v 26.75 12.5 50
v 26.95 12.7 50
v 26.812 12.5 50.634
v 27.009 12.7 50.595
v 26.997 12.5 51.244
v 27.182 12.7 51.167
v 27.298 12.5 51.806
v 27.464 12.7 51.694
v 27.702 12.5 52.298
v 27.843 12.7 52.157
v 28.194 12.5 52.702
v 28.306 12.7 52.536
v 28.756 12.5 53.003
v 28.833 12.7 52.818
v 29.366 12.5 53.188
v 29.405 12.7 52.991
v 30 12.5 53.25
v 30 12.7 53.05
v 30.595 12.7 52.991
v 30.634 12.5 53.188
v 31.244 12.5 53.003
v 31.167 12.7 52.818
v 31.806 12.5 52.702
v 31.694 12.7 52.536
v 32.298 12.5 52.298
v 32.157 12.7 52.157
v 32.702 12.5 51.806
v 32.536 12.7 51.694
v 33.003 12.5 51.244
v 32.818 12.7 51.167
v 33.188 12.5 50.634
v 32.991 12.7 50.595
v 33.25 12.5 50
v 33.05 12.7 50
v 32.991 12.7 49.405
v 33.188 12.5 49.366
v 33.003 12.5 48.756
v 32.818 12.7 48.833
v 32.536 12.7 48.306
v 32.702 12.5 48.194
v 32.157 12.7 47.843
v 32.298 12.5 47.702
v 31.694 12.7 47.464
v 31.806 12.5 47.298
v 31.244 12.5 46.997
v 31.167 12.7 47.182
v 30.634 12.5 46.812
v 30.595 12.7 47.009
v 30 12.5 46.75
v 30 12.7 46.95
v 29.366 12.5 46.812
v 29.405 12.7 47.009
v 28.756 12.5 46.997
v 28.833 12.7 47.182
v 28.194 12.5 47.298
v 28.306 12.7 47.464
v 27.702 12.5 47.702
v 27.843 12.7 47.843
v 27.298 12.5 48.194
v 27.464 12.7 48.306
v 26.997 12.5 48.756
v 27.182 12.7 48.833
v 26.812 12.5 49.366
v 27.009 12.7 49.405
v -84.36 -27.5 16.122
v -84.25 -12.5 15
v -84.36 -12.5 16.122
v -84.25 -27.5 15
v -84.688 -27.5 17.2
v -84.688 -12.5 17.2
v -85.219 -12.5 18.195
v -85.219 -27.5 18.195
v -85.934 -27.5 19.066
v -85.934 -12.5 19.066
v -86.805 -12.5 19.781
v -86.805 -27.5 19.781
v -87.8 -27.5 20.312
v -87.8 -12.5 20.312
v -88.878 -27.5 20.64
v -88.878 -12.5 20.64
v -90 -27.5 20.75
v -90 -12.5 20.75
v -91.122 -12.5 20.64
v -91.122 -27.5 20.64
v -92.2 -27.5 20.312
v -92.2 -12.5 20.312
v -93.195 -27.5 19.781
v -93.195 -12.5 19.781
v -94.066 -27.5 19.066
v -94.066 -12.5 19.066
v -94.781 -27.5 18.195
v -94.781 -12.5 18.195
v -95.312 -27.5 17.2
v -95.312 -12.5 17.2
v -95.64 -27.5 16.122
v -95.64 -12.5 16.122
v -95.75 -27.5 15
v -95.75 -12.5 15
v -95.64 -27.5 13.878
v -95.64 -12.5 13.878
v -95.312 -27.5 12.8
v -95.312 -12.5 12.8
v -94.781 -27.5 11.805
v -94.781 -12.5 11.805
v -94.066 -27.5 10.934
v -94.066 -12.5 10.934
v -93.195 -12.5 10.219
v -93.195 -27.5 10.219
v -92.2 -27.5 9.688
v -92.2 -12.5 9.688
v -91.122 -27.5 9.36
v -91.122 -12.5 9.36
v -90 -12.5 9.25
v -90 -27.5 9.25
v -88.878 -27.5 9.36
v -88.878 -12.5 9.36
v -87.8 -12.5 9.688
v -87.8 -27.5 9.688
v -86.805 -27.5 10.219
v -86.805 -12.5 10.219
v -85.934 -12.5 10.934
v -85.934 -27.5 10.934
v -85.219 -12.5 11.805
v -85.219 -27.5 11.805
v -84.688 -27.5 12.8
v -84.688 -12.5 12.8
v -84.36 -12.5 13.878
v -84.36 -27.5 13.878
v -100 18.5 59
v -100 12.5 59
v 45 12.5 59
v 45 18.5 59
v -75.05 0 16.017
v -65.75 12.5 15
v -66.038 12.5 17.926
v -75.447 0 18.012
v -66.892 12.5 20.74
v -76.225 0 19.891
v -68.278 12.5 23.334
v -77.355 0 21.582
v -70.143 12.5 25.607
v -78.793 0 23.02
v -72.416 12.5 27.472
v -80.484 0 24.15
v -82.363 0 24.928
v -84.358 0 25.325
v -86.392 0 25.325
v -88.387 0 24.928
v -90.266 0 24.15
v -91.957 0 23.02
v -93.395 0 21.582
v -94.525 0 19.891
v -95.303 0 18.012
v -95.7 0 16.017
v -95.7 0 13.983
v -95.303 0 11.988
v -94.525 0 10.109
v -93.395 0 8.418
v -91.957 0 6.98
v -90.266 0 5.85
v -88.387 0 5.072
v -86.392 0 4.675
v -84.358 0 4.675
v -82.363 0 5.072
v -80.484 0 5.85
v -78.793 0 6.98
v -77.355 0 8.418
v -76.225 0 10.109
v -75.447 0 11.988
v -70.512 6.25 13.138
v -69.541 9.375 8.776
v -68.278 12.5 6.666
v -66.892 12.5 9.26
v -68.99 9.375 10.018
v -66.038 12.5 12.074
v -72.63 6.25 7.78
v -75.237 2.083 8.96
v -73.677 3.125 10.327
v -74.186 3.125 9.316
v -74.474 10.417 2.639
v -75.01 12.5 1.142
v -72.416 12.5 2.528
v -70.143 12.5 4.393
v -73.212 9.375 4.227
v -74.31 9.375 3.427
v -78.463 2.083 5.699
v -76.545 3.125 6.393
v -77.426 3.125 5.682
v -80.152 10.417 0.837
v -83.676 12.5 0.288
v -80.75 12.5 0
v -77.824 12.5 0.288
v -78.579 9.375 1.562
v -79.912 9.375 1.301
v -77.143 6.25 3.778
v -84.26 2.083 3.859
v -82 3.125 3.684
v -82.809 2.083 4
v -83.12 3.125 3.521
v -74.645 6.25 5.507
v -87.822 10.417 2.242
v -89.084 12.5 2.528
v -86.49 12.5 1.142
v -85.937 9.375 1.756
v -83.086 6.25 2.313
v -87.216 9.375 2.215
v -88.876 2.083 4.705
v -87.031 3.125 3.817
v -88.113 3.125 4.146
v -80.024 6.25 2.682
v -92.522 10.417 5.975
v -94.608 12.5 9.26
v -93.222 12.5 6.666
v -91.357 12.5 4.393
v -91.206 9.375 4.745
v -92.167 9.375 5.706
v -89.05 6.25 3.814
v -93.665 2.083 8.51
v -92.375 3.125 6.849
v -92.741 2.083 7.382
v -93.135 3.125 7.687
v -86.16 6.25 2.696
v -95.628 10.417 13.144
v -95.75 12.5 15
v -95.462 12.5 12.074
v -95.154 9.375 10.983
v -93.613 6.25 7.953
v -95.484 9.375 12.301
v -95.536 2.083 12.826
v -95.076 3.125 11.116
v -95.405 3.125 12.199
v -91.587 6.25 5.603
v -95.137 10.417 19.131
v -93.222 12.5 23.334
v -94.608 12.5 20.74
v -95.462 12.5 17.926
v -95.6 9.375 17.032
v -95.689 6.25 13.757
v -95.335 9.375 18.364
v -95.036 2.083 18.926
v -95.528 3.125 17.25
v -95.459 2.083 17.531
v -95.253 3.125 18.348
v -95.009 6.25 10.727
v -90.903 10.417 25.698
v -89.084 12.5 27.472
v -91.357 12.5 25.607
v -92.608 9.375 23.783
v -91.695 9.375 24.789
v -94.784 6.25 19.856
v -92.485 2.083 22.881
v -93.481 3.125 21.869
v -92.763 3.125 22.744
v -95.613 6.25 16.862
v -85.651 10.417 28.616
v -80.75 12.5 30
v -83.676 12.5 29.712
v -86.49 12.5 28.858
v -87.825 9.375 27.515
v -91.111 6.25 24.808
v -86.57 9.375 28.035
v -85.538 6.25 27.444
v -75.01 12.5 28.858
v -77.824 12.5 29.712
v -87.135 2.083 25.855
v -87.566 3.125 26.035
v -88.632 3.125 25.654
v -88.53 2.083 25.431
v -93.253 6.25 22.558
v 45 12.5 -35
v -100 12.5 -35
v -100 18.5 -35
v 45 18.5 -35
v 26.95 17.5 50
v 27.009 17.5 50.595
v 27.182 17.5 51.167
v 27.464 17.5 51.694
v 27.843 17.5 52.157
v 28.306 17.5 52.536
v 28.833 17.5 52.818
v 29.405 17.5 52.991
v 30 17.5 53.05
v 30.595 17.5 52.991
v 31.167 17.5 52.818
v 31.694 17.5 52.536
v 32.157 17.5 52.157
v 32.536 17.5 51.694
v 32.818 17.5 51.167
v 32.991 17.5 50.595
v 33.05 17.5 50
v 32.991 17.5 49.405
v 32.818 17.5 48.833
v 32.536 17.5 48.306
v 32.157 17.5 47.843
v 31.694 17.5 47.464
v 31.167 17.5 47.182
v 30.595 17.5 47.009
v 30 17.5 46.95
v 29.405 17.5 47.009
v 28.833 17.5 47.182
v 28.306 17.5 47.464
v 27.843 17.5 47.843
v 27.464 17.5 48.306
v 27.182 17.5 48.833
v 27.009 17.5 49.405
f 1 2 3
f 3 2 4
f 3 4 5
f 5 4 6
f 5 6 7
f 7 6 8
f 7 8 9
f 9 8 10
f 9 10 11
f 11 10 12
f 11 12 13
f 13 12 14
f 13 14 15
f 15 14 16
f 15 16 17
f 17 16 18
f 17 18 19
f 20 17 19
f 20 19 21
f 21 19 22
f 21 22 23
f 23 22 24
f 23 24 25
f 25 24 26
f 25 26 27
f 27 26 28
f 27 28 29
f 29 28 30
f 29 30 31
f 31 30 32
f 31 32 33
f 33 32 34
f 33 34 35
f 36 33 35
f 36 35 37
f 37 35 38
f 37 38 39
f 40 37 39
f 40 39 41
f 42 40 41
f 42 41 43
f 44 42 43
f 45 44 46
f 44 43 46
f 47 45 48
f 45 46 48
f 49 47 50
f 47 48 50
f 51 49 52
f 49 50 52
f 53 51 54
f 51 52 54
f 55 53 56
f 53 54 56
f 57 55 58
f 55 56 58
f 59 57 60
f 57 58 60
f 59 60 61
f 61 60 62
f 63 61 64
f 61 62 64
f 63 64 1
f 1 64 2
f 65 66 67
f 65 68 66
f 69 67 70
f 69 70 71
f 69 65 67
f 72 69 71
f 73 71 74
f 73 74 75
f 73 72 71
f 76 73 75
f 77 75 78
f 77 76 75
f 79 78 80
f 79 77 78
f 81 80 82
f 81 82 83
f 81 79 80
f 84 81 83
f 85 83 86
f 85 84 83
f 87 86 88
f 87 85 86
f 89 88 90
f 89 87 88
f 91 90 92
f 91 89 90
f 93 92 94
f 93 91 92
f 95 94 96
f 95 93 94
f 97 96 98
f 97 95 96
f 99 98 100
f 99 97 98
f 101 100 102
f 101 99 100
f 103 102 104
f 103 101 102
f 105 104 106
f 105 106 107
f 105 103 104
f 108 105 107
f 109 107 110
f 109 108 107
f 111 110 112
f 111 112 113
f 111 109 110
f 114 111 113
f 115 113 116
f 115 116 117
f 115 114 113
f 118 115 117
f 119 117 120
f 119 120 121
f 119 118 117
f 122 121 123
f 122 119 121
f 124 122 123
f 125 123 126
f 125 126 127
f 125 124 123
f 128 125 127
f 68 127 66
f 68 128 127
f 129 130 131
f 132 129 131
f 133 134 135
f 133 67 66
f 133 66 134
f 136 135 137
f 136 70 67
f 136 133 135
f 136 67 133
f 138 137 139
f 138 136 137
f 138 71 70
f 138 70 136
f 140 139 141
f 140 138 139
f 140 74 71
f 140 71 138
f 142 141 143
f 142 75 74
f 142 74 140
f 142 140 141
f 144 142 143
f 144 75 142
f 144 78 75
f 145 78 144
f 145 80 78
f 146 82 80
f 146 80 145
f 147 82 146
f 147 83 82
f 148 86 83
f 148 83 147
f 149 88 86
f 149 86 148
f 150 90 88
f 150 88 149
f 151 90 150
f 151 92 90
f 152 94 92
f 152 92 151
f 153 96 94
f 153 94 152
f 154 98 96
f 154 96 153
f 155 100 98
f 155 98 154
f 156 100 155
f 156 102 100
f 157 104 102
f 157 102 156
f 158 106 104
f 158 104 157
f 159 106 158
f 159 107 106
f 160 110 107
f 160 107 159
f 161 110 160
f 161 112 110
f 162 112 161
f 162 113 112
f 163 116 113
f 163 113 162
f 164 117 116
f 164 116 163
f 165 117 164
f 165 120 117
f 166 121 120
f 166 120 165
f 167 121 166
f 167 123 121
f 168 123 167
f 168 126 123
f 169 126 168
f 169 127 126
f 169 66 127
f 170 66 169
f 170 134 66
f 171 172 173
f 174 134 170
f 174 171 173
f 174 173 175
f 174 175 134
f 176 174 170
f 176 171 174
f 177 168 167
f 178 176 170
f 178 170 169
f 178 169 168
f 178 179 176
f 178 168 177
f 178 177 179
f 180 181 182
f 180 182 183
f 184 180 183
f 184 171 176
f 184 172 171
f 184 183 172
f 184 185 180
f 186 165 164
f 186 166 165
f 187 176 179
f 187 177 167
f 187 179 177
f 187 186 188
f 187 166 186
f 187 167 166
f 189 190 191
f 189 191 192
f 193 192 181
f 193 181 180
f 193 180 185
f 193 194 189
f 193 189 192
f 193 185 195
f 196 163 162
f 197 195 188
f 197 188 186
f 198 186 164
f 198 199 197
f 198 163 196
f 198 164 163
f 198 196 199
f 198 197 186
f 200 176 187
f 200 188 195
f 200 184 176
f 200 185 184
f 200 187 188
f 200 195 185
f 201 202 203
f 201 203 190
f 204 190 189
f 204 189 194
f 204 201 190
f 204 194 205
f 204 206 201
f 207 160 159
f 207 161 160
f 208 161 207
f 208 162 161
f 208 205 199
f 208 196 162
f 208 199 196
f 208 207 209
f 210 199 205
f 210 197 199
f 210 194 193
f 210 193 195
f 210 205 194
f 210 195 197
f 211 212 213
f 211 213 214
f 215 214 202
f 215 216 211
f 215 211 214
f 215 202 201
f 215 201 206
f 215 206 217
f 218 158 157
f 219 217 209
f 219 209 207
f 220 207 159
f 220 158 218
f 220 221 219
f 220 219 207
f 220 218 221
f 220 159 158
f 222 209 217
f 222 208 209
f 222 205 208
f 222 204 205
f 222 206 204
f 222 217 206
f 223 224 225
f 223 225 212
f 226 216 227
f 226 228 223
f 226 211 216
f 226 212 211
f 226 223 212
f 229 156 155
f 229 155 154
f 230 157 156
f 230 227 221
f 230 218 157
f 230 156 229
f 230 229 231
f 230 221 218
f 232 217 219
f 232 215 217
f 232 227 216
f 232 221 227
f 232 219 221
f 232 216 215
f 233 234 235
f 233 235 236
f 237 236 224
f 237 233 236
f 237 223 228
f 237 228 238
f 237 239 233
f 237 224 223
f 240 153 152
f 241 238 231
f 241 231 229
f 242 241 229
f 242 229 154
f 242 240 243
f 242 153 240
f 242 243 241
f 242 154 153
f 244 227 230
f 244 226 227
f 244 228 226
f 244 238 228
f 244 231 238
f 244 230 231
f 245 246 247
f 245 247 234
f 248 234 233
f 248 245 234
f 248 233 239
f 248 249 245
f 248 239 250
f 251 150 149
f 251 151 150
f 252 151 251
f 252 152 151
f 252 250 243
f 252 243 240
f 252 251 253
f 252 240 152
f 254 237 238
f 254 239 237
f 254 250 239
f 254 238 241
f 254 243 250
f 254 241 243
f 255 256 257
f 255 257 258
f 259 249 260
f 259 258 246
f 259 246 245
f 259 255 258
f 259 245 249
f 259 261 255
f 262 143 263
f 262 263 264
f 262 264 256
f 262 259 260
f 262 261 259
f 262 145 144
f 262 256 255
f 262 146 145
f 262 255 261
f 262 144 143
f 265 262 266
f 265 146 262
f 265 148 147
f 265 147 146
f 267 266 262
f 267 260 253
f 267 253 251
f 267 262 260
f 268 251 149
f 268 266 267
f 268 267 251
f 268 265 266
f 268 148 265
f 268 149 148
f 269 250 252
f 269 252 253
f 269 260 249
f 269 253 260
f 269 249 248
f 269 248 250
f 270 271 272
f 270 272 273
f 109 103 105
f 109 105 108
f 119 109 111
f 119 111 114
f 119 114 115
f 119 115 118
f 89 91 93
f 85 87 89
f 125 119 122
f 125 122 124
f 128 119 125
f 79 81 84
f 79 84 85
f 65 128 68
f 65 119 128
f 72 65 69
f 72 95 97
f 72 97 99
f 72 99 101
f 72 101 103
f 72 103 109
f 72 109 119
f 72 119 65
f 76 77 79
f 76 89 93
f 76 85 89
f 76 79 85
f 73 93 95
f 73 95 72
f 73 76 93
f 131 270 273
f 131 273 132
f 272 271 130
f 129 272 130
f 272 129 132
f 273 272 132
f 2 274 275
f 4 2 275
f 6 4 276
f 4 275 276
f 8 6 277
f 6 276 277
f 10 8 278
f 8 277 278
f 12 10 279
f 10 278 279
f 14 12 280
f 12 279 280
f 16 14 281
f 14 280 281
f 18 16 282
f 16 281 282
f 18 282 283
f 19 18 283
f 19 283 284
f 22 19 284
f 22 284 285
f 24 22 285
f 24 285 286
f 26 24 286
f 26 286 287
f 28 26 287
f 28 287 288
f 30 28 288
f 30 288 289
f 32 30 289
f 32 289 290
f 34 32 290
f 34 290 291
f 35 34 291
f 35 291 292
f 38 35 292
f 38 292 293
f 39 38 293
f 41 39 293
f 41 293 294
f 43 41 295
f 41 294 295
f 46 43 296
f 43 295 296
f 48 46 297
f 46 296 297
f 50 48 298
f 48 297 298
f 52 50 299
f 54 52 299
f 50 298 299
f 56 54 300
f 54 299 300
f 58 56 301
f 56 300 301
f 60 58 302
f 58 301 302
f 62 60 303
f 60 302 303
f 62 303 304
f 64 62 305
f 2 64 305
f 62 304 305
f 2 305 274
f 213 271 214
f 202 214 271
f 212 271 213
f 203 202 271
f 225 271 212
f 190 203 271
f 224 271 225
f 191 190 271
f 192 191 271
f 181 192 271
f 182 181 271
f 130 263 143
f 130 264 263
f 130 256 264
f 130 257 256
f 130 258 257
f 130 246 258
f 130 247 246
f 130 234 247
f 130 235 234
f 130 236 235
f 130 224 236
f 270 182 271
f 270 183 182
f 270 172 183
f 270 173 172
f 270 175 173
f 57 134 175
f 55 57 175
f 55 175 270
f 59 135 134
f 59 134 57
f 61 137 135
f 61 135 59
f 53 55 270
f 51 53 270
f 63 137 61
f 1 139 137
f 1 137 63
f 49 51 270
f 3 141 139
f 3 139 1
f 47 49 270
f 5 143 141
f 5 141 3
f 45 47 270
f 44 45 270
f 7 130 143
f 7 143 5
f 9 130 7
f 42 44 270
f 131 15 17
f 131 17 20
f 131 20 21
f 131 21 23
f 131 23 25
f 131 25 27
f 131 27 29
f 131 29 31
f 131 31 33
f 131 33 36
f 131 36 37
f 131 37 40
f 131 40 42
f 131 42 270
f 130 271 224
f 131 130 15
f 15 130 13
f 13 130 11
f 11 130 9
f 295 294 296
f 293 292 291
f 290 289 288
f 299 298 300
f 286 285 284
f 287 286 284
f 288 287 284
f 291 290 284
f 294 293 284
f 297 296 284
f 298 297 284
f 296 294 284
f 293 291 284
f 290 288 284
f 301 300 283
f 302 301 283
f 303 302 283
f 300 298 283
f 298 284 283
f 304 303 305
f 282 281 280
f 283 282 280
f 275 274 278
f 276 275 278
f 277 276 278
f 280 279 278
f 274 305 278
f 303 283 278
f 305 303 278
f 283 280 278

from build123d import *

# Parameters (mm, degrees)
SKETCH002_W      = 145
SKETCH002_H      = 94
PAD004_DEPTH     = 6
HOLE_D           = 6.1
HOLE_DEPTH       = 5
HOLE_CSINK_D     = 6.5
HOLE_CSINK_ANGLE = 90
SKETCH013_R      = 15
SKETCH014_R      = 5.75
SKETCH005_R      = 5.75


with BuildPart() as part:
    # Sketch002 → Pad004 (new body)
    with BuildSketch(Plane.XZ.offset(-12.5)):
        with Locations((-27.5, 12)):
            Rectangle(SKETCH002_W, SKETCH002_H)
    extrude(amount=-PAD004_DEPTH)

    # Hole
    with Locations(Plane.XZ.offset(-12.5)):
        with Locations((30, 50)):
            CounterSinkHole(HOLE_D / 2, HOLE_CSINK_D / 2, depth=HOLE_DEPTH, counter_sink_angle=HOLE_CSINK_ANGLE)

    # Sketch013 → AdditiveLoft001 section 0
    with BuildSketch(Plane.XZ.offset(-12.5)):
        with Locations((-80.75, 15)):
            Circle(SKETCH013_R)
    # Sketch014 → AdditiveLoft001 section 1
    with BuildSketch(Plane.XZ.offset(12.5)):
        with Locations((-90, 15)):
            Circle(SKETCH014_R)
    # Sketch005 → AdditiveLoft001 section 2
    with BuildSketch(Plane.XZ.offset(27.5)):
        with Locations((-90, 15)):
            Circle(SKETCH005_R)
    loft(ruled=True)


solid = part.part
